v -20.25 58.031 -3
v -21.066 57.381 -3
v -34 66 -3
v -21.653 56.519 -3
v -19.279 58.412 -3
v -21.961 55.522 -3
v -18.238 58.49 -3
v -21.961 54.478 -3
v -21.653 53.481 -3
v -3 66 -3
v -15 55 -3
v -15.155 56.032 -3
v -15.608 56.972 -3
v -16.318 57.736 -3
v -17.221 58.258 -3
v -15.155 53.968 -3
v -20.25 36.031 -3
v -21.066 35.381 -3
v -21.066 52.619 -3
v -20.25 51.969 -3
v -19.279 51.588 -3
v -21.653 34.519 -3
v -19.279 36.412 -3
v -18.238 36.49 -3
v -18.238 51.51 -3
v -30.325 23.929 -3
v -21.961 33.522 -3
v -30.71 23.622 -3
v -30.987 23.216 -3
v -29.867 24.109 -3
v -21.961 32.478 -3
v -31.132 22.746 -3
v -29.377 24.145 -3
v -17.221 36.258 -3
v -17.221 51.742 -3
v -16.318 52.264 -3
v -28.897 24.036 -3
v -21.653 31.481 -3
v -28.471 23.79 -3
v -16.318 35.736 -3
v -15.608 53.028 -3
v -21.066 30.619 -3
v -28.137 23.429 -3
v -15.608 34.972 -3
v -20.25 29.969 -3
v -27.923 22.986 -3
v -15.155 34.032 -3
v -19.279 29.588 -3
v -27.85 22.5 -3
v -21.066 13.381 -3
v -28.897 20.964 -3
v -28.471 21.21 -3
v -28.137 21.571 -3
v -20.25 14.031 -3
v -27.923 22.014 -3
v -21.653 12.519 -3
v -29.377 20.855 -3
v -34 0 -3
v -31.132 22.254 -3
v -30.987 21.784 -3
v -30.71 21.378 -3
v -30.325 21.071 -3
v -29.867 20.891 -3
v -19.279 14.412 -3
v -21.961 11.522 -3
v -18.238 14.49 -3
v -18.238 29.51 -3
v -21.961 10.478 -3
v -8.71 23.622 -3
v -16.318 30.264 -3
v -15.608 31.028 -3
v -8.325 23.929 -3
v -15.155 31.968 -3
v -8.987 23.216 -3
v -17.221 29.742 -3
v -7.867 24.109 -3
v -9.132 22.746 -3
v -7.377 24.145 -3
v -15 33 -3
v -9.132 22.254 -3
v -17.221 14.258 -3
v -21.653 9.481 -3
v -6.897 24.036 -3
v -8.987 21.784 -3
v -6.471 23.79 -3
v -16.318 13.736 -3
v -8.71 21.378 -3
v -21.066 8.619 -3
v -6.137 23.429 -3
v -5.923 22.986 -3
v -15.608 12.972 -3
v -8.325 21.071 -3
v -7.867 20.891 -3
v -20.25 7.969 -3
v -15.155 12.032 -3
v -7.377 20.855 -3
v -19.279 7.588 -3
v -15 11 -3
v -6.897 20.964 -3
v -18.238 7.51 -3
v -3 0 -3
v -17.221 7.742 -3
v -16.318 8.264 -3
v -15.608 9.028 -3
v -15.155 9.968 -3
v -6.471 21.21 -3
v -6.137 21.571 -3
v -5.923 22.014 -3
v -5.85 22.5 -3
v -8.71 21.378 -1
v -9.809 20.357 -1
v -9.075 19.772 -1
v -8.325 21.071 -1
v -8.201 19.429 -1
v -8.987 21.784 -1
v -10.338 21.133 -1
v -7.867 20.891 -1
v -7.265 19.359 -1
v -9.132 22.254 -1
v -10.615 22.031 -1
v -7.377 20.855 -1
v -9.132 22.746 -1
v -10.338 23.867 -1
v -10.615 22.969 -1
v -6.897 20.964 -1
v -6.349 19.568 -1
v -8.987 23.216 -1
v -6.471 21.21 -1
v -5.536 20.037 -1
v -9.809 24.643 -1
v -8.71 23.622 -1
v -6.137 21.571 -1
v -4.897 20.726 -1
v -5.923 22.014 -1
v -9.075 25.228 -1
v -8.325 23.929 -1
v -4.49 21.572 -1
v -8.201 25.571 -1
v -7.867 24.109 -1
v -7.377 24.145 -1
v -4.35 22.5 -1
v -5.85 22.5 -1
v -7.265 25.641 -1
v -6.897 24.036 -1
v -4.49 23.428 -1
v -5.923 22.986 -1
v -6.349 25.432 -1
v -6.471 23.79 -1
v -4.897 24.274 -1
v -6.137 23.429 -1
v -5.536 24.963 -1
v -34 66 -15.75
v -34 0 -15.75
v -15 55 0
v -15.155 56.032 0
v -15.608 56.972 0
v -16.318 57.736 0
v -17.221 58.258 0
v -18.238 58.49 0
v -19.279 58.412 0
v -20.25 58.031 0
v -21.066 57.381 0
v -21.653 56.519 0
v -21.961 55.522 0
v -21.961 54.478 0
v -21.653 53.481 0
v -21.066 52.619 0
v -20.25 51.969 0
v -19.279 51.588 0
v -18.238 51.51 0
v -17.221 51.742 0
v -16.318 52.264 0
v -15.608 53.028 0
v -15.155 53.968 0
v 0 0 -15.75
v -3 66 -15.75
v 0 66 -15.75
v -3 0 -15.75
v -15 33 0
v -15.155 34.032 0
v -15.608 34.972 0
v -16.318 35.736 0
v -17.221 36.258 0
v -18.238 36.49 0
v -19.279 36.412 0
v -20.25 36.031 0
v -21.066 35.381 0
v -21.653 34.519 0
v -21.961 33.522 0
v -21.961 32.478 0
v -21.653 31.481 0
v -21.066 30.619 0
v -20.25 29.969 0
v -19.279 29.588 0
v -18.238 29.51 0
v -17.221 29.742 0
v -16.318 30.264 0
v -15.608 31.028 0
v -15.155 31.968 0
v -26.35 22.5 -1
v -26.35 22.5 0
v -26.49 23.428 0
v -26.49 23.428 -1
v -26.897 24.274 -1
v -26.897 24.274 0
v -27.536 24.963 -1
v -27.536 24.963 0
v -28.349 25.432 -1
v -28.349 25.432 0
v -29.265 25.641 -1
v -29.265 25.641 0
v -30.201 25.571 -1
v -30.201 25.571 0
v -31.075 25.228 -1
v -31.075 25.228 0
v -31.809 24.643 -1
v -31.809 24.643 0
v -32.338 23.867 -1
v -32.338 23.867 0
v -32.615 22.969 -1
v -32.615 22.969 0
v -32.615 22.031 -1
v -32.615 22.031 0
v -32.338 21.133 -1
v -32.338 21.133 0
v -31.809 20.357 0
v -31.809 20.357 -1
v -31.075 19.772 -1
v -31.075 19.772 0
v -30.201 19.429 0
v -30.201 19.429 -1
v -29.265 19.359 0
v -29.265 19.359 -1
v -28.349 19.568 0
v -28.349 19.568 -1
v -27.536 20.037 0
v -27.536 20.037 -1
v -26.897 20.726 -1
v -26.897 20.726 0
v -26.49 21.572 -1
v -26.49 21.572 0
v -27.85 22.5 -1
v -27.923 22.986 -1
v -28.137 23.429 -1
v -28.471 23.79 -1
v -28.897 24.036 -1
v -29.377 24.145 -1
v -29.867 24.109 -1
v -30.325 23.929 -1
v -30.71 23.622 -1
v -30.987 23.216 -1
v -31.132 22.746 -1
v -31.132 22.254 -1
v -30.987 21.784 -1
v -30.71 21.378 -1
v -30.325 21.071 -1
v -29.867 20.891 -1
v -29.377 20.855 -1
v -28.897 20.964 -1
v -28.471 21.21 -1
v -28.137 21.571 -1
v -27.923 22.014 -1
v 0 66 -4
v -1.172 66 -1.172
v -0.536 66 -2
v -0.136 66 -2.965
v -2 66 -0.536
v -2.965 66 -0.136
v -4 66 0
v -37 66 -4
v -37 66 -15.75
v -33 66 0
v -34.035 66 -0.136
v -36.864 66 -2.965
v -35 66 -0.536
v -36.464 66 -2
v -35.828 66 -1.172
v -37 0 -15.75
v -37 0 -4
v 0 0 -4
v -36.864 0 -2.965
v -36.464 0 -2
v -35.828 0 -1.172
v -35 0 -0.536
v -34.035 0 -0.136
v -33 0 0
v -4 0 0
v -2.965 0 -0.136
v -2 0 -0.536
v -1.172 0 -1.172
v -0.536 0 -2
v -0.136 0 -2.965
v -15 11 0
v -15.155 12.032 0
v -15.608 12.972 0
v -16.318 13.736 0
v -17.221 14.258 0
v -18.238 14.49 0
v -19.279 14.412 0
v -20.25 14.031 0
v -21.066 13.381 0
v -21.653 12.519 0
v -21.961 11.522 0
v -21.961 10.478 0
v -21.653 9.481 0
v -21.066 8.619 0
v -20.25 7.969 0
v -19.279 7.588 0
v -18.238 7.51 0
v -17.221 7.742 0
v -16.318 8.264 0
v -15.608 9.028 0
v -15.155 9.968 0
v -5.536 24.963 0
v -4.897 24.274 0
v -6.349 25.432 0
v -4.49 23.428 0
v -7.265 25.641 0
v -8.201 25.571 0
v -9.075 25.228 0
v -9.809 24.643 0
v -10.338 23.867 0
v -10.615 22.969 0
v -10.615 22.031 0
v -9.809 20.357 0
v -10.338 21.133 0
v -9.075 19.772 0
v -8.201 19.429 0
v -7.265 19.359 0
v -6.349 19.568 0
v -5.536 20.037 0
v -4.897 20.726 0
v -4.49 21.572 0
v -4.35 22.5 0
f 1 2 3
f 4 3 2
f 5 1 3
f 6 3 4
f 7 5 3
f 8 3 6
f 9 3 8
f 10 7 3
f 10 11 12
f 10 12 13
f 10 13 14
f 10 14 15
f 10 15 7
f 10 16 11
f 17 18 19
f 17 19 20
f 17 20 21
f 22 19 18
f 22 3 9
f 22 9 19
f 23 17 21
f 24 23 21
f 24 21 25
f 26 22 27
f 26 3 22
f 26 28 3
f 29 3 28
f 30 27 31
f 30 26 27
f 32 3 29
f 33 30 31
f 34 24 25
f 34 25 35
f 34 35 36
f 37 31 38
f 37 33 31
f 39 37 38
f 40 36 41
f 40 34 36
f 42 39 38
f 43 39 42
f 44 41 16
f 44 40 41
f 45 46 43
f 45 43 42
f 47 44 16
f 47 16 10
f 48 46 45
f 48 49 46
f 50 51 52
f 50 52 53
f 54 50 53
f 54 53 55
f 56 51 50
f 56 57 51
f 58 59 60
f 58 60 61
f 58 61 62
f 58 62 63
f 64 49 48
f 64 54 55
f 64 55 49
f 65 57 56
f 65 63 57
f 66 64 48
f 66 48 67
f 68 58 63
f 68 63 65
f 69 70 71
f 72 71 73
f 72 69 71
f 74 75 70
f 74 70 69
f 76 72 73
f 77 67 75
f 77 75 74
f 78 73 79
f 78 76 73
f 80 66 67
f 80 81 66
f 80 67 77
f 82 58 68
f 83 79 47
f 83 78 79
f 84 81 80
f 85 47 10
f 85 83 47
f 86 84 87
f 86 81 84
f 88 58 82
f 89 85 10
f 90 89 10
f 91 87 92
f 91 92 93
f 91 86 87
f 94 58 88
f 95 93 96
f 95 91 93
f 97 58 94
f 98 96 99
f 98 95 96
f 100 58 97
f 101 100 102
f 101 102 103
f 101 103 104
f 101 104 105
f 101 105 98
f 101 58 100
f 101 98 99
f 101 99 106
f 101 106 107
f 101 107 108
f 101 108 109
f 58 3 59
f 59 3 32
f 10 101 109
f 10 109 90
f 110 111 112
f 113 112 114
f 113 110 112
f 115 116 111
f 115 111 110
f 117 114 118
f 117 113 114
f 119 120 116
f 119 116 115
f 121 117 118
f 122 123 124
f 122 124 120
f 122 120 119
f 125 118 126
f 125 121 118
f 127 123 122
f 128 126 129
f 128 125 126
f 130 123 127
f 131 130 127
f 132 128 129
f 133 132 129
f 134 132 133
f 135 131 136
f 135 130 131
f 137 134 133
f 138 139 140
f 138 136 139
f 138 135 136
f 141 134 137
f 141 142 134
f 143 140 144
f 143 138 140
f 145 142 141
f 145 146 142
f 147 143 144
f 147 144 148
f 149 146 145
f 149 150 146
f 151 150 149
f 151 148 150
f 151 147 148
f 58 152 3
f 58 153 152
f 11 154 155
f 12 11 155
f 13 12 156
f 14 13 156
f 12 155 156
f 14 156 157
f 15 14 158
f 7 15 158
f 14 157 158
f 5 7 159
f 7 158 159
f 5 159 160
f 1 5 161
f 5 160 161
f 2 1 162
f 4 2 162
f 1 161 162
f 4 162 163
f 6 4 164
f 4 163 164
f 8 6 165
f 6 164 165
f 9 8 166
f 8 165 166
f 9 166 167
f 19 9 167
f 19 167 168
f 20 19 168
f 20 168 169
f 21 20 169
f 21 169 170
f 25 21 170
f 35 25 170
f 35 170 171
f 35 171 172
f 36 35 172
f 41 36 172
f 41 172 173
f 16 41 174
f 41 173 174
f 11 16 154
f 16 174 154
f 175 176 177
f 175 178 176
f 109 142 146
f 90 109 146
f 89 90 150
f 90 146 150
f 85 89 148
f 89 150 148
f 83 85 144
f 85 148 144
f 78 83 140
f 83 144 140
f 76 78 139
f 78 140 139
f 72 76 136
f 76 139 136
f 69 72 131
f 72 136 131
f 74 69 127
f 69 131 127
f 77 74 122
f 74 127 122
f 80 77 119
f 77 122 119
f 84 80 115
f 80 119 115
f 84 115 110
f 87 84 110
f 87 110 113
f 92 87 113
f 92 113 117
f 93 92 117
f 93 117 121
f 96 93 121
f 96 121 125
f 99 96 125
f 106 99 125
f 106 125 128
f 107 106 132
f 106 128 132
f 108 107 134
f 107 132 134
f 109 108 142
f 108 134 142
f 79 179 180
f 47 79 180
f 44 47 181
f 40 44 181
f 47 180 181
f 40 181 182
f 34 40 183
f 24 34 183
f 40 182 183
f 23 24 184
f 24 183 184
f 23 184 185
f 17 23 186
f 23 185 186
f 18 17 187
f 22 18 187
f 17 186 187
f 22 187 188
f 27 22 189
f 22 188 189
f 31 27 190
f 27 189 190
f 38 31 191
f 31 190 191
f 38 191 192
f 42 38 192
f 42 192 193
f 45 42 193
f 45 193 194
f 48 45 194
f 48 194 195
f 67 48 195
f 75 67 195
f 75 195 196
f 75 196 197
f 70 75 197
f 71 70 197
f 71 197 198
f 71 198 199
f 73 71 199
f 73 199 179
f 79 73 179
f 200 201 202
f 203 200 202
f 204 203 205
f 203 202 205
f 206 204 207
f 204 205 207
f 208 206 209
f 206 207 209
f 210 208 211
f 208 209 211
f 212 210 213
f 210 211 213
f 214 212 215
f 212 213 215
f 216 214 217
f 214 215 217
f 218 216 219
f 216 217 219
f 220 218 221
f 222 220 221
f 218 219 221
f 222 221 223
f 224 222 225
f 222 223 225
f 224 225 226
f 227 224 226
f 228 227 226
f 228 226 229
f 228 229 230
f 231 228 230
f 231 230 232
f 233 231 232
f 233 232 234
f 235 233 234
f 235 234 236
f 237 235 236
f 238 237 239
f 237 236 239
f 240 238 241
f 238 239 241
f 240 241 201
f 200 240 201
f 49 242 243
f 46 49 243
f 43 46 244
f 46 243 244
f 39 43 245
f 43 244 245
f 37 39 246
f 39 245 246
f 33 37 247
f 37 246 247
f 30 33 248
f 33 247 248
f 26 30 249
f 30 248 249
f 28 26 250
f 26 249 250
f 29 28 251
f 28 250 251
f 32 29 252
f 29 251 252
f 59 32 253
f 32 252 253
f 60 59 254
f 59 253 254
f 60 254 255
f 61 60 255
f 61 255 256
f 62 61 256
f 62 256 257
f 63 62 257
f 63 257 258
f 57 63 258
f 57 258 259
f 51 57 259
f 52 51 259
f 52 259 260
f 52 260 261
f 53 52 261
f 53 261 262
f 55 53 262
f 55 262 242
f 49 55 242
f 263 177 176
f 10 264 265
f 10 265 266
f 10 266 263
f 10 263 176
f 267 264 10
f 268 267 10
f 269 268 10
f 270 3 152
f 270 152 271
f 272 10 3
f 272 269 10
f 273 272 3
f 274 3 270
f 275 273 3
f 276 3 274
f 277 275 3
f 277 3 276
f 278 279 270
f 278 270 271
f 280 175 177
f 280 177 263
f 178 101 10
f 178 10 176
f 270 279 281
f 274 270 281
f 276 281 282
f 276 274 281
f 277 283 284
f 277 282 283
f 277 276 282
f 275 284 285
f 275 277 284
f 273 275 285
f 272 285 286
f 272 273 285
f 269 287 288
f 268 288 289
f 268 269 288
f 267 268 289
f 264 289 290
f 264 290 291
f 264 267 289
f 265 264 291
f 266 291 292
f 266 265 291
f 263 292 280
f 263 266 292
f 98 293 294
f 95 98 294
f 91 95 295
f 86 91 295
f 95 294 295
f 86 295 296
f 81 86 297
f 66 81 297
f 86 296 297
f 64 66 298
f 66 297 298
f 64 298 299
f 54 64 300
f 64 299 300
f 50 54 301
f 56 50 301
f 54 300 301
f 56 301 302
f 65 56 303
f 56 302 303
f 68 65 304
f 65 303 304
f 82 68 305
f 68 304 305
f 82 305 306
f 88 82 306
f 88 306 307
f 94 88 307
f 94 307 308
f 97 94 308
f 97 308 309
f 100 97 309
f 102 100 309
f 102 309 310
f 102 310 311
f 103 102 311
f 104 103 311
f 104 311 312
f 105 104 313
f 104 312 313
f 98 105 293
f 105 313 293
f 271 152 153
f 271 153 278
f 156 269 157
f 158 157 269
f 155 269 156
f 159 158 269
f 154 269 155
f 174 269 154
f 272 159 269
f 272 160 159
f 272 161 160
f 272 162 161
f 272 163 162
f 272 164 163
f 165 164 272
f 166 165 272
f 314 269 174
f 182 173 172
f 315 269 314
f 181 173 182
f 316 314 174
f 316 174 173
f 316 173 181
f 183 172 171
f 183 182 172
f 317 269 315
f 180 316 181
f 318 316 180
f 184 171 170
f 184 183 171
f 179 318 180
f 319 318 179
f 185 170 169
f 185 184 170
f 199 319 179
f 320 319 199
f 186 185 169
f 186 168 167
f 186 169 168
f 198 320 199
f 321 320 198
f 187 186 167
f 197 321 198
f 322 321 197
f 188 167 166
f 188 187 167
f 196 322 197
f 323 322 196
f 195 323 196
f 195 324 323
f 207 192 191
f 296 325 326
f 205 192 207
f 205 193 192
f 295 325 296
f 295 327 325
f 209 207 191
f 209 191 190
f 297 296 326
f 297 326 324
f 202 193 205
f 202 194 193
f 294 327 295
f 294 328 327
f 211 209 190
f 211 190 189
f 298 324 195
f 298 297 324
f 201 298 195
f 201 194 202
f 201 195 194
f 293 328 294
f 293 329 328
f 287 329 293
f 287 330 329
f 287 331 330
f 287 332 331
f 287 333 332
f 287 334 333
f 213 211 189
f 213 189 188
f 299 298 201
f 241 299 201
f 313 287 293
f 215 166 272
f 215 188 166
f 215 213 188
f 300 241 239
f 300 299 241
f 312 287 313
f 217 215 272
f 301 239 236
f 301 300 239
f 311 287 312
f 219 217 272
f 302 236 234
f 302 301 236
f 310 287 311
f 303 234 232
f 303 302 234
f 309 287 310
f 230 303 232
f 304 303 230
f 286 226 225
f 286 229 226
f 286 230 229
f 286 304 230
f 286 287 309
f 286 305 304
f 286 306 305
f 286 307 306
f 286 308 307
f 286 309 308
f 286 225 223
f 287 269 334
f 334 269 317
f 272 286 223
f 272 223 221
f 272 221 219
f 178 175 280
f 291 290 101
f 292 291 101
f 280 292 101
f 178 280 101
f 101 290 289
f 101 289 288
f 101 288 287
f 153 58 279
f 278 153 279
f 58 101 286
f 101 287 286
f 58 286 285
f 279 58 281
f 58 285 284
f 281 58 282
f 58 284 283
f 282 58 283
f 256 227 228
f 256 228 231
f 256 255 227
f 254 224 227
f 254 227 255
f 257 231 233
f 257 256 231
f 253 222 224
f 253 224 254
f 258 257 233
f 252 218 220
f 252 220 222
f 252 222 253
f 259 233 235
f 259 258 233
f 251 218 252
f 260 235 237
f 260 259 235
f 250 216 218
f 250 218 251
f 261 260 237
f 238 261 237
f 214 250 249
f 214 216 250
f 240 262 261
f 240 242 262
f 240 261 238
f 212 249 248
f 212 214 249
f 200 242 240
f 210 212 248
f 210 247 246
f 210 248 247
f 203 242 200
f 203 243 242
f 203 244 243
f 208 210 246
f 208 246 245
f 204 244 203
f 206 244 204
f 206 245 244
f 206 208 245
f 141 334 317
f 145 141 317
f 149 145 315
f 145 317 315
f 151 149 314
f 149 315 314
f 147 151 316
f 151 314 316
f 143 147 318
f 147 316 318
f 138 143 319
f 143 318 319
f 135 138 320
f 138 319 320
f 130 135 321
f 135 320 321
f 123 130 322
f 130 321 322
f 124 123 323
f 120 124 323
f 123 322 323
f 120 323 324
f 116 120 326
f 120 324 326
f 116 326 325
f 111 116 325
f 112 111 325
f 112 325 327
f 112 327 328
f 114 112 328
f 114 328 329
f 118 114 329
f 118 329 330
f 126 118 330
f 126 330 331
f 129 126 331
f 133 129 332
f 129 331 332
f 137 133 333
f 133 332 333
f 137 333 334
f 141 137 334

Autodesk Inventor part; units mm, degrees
ref_plane "YZ Plane" through (0, 0, 0) normal (1, 0, 0) x (0, 1, 0)
ref_plane "XZ Plane" through (0, 0, 0) normal (0, 1, 0) x (-1, 0, 0)
ref_plane "XY Plane" through (0, 0, 0) normal (0, 0, 1) x (1, 0, 0)
sketch "Esquisse1" plane through (0, 0, 0) normal (0, 1, 0) x (-1, 0, 0)
  line L0 (0, 0) -> (37, 0)
  line L1 (37, 0) -> (37, -31.5)
  line L2 (37, -31.5) -> (0, -31.5)
  line L3 (0, -31.5) -> (0, 0)
  line L4 (34, -28.5) -> (34, -3)
  line L5 (34, -3) -> (3, -3)
  line L6 (3, -3) -> (3, -28.5)
  line L7 (3, -28.5) -> (34, -28.5)
  line L8 (3, -15.75) -> (0, -15.75)
  line L9 (34, -15.75) -> (37, -15.75)
  dimension "d0" = 3
  dimension "d1" = 31
  dimension "d2" = 25.5
extrude "Extrusion1" add sketch "Esquisse1" along normal blind 66 contours L0 L1 L9 L4 L5 L6 L8 L3
sketch "Esquisse2" plane through (-37, 0, 0) normal (0, 0, 1) x (1, 0, 0)
  line L0 (7.5, 22.5) -> (29.5, 22.5) construction
  circle A0 centre (7.5, 22.5) radius 1.65
  circle A1 centre (29.5, 22.5) radius 1.65
  line L1 (34, 0) -> (3, 0) construction
  line L2 (18.5, 0) -> (18.5, 22.5) construction
  point P0 (37, 0)
  dimension "d36" = 4
  dimension "d5" = 3.3
  dimension "d6" = 22.5
  dimension "d7" = 22
extrude "Extrusion2" cut sketch "Esquisse2" against normal through all
sketch "Esquisse3" plane through (-33, 0, 0) normal (0, 0, 1) x (1, 0, 0)
  line L0 (-4, 66) -> (33, 66) construction
  line L1 (-4, 0) -> (33, 0) construction
  circle A0 centre (3.5, 22.5) radius 1.65 construction
  circle A1 centre (25.5, 22.5) radius 1.65 construction
  circle A2 centre (3.5, 22.5) radius 1.65 construction
  circle A3 centre (3.5, 22.5) radius 3.15
  circle A4 centre (25.5, 22.5) radius 3.15
  line L2 (33, 0) -> (33, 66) projected
  line L3 (-4, 0) -> (-4, 66) projected
  dimension "d11" = 6.3
extrude "Extrusion3" cut sketch "Esquisse3" against normal blind 1
sketch "Esquisse4" plane through (-33, 0, 0) normal (0, 0, 1) x (1, 0, 0)
  line L0 (-4, 66) -> (33, 66) construction
  line L1 (14.5, 66) -> (14.5, 0) construction
  line L2 (30, 0) -> (-1, 0) construction
  circle A0 centre (14.5, 11) radius 3.5
  circle A1 centre (14.5, 33) radius 3.5
  circle A2 centre (14.5, 55) radius 3.5
  point P0 (33, 0)
  point P1 (0, 56.5)
  point P2 (29, 56.5)
  point P3 (33, 66)
  dimension "d14" = 11
  dimension "d15" = 7
  dimension "d31" = 22
extrude "Extrusion4" cut sketch "Esquisse4" against normal through all
fillet "Congé4" radius 4 2 edges at (0, 33, 0) (-37, 33, 0)
properties part number "part2_top"
